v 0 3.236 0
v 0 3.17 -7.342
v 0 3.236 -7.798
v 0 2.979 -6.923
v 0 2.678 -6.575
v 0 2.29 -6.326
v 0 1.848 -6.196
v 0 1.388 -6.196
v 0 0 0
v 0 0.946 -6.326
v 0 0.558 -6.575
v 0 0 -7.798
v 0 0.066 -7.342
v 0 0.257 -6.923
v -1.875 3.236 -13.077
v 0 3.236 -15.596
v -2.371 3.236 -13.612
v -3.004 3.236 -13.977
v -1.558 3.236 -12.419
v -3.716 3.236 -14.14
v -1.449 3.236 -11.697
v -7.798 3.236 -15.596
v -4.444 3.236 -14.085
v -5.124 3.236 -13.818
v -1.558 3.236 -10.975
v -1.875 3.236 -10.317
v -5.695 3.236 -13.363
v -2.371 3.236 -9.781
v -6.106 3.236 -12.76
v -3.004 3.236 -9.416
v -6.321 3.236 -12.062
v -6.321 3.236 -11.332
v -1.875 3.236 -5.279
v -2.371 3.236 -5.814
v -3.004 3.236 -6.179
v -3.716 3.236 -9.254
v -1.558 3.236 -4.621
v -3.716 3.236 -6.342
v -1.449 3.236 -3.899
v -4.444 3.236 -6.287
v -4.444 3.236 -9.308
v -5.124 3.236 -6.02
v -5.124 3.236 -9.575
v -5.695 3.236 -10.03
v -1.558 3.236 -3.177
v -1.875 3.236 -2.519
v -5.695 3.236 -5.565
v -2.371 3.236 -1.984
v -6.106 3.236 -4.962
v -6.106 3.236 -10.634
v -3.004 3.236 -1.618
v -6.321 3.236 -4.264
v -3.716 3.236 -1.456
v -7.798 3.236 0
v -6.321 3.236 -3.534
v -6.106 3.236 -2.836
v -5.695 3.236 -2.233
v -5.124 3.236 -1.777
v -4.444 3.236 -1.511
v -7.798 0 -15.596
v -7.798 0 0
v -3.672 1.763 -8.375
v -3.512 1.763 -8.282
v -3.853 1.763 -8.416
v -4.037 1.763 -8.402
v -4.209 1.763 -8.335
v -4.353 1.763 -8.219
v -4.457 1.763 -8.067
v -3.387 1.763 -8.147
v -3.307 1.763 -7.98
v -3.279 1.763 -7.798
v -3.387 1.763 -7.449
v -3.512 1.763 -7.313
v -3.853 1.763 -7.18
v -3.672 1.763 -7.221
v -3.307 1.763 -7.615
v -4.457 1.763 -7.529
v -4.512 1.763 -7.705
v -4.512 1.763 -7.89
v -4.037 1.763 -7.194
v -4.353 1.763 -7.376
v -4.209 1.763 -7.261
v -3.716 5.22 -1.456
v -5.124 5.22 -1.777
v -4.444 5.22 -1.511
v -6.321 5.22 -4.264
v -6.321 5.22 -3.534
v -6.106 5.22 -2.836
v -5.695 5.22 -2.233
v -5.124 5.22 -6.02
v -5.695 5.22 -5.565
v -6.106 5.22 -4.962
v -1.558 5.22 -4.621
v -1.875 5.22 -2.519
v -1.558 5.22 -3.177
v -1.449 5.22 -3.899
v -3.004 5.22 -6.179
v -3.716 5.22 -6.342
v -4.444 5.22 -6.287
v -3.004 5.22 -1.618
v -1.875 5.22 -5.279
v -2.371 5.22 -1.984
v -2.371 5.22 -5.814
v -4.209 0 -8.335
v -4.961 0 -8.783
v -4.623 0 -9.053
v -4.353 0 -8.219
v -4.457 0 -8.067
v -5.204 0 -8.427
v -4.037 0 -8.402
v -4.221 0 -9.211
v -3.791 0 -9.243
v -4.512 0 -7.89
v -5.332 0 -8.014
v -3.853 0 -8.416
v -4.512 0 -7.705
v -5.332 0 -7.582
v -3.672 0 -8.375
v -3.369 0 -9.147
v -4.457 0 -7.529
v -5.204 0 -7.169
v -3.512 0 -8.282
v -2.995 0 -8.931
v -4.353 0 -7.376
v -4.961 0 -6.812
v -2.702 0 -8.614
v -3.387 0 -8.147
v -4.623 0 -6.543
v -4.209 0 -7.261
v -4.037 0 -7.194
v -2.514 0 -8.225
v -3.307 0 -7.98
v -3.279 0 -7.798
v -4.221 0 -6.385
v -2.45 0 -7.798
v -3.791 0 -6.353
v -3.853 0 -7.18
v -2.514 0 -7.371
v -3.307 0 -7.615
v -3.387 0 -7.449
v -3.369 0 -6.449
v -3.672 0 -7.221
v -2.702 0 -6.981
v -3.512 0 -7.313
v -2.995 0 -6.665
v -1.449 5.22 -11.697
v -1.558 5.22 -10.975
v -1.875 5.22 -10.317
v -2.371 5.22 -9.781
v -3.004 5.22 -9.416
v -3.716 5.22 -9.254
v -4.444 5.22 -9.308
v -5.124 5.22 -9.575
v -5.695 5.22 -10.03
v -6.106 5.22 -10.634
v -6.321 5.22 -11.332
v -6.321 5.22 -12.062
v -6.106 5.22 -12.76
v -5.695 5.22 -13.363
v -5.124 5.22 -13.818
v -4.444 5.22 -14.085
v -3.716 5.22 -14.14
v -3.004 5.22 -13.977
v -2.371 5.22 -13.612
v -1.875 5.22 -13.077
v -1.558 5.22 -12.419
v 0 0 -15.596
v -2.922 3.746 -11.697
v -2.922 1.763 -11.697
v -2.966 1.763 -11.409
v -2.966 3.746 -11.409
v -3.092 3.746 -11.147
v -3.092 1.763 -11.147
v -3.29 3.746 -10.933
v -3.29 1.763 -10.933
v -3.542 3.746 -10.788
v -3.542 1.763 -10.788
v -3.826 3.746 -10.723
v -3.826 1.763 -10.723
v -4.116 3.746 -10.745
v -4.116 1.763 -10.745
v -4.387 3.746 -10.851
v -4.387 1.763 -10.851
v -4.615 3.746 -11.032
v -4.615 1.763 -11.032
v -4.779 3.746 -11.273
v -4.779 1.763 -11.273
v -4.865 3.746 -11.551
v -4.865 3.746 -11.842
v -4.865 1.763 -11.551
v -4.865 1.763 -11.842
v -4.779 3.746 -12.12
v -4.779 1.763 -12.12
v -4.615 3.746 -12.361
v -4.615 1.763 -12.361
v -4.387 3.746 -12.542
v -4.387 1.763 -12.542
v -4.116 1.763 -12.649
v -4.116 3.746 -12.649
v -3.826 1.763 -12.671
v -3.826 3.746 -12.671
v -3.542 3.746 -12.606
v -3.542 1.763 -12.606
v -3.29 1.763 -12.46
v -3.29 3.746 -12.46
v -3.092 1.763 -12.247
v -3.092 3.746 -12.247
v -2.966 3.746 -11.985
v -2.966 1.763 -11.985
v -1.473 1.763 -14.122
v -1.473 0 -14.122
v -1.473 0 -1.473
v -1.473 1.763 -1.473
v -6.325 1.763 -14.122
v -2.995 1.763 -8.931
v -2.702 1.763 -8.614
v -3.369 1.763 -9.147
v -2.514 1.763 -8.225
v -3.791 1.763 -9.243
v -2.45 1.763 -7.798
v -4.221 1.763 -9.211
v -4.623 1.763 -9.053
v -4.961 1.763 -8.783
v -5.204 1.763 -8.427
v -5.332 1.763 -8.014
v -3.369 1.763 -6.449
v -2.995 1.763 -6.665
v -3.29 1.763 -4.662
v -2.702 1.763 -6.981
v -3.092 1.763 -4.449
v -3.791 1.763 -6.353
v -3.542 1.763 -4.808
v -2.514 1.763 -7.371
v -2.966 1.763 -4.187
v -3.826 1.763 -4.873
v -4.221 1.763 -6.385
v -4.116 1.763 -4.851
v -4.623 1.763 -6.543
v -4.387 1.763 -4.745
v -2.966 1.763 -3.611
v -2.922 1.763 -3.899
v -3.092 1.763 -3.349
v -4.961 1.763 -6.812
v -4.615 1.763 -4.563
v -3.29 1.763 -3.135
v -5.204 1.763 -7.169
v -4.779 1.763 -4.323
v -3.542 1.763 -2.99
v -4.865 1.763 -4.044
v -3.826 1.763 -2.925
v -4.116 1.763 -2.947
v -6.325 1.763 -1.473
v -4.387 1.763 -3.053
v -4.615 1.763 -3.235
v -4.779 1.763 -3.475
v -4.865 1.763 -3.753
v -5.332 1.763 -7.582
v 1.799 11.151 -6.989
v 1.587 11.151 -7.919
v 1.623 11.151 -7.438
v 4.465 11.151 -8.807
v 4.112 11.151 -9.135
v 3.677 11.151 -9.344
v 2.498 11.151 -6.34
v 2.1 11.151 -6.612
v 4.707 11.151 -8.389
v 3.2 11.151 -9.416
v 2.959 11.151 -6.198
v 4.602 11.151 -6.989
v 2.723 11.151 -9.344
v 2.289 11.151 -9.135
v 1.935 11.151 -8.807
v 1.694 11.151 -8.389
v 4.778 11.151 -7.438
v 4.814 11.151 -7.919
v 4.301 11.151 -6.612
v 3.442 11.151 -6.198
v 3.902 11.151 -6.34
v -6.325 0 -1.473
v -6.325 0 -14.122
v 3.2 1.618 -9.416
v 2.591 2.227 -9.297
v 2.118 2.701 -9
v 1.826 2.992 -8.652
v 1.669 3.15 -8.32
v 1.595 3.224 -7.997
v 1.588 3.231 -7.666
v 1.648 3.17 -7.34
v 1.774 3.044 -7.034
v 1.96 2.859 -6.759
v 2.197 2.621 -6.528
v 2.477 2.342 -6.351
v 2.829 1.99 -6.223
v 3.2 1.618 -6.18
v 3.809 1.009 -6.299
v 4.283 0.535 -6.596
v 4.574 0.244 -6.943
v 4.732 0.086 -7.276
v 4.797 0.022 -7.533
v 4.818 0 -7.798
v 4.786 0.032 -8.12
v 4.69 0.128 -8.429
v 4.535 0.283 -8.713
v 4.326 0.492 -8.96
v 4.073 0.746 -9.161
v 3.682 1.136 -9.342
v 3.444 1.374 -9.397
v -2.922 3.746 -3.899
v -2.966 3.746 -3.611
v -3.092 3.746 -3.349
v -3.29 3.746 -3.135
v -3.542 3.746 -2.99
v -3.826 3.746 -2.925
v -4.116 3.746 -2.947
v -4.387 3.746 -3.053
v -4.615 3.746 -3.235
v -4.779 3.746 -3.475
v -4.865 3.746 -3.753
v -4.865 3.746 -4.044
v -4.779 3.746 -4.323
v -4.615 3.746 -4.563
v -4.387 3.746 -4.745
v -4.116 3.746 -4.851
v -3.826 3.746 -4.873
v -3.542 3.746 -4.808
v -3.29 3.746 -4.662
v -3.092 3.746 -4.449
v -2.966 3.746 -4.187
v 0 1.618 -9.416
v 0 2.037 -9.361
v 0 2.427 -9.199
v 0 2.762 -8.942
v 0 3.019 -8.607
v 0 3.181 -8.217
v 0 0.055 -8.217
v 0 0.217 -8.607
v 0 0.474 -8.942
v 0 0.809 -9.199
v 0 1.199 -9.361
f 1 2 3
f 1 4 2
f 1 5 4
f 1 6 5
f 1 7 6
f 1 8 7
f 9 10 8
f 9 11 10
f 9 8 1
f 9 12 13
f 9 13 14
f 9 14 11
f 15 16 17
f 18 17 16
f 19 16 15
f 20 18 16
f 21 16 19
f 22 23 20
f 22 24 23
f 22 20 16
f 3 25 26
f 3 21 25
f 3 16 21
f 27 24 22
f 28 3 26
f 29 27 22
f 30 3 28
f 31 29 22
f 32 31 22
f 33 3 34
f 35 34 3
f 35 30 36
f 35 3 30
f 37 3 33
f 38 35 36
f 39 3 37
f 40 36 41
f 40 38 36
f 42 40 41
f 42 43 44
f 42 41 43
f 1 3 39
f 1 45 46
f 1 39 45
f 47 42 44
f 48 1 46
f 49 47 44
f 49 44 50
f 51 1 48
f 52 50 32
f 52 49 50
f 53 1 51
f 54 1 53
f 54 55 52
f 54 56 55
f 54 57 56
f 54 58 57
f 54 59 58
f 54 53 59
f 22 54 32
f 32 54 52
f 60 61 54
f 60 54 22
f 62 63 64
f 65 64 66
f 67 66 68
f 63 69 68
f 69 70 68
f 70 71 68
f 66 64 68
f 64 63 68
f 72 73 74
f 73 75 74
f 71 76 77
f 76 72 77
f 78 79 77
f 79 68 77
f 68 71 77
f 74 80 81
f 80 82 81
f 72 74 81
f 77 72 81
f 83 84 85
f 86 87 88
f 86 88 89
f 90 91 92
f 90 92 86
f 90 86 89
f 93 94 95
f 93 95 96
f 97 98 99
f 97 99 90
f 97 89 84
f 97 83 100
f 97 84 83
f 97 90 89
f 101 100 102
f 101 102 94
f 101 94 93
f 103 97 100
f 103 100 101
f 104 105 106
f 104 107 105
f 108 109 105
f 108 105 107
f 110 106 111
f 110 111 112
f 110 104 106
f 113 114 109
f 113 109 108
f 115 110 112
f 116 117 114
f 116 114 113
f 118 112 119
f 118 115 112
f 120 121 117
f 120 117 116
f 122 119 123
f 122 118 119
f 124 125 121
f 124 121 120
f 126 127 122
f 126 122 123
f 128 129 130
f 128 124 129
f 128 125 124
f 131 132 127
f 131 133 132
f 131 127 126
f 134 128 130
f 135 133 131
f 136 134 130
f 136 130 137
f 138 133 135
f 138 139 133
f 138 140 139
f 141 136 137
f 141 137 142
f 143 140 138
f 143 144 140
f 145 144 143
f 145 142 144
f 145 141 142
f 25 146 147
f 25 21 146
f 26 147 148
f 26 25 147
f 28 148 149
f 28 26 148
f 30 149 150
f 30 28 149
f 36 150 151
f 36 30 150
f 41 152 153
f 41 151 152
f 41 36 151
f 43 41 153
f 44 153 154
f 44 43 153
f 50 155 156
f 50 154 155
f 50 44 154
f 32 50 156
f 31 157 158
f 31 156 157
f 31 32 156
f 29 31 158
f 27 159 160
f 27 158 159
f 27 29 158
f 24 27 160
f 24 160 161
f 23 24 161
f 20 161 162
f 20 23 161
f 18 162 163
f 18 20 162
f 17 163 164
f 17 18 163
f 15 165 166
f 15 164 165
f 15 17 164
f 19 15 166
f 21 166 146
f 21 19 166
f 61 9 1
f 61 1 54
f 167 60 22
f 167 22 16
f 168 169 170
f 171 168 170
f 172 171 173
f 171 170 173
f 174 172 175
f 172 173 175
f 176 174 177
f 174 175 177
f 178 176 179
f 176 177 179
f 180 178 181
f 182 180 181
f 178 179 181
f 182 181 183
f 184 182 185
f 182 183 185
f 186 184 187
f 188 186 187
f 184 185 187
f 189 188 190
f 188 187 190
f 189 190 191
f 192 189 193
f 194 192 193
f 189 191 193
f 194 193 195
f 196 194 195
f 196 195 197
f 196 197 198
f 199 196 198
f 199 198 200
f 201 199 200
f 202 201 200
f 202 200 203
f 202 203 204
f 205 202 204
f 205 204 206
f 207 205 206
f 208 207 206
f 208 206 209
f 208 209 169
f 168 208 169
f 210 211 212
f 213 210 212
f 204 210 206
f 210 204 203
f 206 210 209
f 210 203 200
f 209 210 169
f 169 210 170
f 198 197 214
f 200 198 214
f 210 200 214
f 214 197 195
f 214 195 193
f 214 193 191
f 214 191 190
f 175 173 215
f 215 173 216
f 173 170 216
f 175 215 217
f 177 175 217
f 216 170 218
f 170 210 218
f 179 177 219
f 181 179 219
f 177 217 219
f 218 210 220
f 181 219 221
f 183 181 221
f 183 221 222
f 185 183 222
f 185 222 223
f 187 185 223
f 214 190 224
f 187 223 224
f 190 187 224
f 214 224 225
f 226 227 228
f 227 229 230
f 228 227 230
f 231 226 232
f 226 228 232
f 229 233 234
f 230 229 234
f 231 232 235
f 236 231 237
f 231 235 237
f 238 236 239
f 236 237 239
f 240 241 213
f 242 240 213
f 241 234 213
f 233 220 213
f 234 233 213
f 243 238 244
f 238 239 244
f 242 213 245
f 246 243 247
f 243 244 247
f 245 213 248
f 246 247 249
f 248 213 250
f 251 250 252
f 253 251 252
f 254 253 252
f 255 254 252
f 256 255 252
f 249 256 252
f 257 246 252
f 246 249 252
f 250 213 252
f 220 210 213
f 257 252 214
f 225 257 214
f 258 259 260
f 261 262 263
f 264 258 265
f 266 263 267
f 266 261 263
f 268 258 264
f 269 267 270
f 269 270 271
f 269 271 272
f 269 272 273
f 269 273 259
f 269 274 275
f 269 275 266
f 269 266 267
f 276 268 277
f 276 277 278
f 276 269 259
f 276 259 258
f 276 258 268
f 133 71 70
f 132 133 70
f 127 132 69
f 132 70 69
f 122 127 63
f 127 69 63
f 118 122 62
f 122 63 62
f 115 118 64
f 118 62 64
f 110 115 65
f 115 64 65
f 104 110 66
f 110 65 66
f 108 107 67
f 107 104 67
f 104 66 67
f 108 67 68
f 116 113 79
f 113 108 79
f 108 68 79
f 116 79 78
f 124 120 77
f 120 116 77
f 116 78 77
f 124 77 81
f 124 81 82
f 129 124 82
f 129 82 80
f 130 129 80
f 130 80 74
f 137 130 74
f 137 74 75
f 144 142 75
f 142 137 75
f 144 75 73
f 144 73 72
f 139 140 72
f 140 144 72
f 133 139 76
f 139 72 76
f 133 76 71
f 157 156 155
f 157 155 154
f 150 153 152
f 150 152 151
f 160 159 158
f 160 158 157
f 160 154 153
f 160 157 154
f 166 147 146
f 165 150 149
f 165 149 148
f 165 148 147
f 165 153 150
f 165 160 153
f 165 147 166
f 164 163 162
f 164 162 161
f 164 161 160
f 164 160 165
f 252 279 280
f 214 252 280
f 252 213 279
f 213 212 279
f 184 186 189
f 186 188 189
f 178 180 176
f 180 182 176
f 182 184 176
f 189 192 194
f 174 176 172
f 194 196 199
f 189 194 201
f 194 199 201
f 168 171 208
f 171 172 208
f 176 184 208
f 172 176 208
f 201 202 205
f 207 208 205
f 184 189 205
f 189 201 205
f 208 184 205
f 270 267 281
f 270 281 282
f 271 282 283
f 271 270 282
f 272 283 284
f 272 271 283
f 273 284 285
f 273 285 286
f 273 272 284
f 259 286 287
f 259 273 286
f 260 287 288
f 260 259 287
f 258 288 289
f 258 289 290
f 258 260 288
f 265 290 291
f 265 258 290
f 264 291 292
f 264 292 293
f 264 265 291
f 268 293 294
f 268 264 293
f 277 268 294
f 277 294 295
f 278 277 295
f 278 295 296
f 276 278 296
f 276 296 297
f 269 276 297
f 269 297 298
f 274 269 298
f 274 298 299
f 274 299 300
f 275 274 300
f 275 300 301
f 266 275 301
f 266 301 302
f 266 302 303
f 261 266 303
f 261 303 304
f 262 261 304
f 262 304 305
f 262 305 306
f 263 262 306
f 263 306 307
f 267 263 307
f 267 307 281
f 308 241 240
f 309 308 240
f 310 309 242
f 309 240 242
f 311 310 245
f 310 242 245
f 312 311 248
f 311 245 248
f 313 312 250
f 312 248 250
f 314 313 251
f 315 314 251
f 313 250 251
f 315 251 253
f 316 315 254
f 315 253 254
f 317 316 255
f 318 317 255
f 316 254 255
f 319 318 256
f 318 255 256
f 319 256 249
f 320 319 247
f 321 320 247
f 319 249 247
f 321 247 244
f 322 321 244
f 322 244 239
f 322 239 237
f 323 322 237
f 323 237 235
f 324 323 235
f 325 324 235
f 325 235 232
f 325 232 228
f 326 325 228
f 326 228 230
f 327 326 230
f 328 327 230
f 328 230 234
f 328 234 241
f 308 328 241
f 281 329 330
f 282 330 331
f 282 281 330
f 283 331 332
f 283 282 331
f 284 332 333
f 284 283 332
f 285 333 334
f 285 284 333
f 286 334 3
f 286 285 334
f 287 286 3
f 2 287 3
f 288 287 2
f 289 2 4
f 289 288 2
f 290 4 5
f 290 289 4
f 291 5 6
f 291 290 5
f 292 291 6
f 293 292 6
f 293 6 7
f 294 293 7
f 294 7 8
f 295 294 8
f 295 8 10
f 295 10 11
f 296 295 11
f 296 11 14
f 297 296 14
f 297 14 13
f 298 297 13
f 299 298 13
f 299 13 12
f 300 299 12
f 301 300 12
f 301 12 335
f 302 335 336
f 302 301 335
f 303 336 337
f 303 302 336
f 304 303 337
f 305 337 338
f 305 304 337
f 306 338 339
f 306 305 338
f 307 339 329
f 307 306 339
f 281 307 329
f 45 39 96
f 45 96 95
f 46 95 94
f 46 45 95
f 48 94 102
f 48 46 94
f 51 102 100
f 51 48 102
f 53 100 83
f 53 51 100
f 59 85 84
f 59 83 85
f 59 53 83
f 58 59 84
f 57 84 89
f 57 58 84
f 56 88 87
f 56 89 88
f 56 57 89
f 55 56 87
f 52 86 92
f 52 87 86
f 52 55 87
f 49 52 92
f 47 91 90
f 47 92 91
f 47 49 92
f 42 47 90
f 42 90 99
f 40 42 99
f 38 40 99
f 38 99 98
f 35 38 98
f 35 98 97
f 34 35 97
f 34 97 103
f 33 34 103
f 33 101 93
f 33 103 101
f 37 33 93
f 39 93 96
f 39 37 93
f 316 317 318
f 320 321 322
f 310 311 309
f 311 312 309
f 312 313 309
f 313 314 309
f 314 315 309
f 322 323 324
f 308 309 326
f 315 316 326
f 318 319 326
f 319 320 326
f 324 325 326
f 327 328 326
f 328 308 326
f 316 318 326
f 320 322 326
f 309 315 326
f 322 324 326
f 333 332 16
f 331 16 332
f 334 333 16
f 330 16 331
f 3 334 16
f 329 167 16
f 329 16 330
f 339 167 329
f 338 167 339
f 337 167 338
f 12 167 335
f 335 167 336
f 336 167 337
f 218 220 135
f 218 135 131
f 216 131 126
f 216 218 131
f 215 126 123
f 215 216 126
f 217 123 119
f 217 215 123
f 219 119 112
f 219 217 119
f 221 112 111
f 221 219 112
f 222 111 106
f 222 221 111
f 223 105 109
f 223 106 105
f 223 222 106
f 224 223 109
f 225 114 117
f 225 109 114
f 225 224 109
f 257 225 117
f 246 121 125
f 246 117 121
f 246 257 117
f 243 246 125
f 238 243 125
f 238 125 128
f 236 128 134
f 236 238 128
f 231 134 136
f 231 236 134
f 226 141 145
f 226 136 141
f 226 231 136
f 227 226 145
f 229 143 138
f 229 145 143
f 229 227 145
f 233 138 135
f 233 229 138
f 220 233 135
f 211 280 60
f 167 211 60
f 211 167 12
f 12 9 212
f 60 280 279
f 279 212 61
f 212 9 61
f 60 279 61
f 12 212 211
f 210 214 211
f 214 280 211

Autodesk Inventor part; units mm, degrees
ref_plane "YZ Plane" through (0, 0, 0) normal (1, 0, 0) x (0, 1, 0)
ref_plane "XZ Plane" through (0, 0, 0) normal (0, 1, 0) x (-1, 0, 0)
sketch "Sketch1" plane through (0, 0, 0) normal (0, 1, 0) x (-1, 0, 0)
  line L0 (0, 0) -> (7.7978, 0)
  line L1 (7.7978, 0) -> (7.7978, -15.5956)
  line L2 (7.7978, -15.5956) -> (0, -15.5956)
  line L3 (0, -15.5956) -> (0, 0)
  dimension "d0" = 7.7978
  dimension "d1" = 15.5956
extrude "Extrusion1" add sketch "Sketch1" along normal blind 3.236
sketch "Sketch2" plane through (0, 3.236, 0) normal (0, 1, 0) x (1, 0, 0)
  line L0 (0, 0) -> (-3.8989, 0) construction
  line L1 (-3.8989, 0) -> (-3.8989, 3.8989) construction
  line L2 (-3.8989, 3.8989) -> (0, 3.8989) construction
  line L3 (0, 3.8989) -> (0, 0) construction
  circle A0 centre (-3.8989, 3.8989) radius 2.4498
  dimension "d4" = 3.8989
  dimension "d5" = 3.8989
  dimension "d6" = 4.8997
extrude "Extrusion2" add sketch "Sketch2" along normal blind 1.9837
pattern_linear "Rectangular Pattern1" count 2 spacing 7.7978 along (0, 0, -1) of "Extrusion2"
shell "Shell1" thickness 1.4732 removed faces 1 at (-2.5993, 0, -5.1985)
sketch "Sketch3" plane through (-6.3246, 1.7628, -1.4732) normal (0, -1, 0) x (1, 0, 0)
  circle A0 centre (2.4257, -2.4257) radius 2.4498 construction
  circle A1 centre (2.4257, -10.2235) radius 2.4498 construction
  circle A2 centre (2.4257, -2.4257) radius 0.9766 construction
  line L0 (2.4257, -2.4257) -> (2.4257, -10.2235) construction
  circle A3 centre (2.4257, -6.3246) radius 0.6198
  circle A4 centre (2.4257, -6.3246) radius 1.4491
  point P0 (6.3246, 1.4732)
  dimension "d13" = 1.2395
extrude "Extrusion3" add sketch "Sketch3" along normal up to surface (1.7628 mm away)
sketch "Sketch4" plane through (0, 0, 0) normal (1, 0, 0) x (0, 0, -1)
  line L0 (0, 0) -> (0, 3.236) construction
  line L1 (15.5956, 0) -> (0, 0) construction
  line L2 (0, 3.236) -> (15.5956, 0) construction
  circle A0 centre (7.7978, 1.618) radius 1.618
ref_plane "Work Plane1" through (-7.7978, 0, -7.7978) normal (0, 0, 1) x (1, 0, 0)
sketch "Sketch6" plane through (-7.7978, 0, -7.7978) normal (0, 0, 1) x (1, 0, 0)
  line L0 (7.7978, 0) -> (7.7978, 3.236) projected
  line L1 (7.7978, 1.618) -> (10.9982, 1.618)
  line L2 (10.9982, 1.618) -> (10.9982, 11.1506)
  dimension "d20" = 3.2004
  dimension "d21" = 9.5326
sweep "Sweep1" add profiles "Sketch4" path "Sketch6" path curves L1 L2
properties part number "1x2 short black pegged with stick thingy" material "ABS Plastic"
